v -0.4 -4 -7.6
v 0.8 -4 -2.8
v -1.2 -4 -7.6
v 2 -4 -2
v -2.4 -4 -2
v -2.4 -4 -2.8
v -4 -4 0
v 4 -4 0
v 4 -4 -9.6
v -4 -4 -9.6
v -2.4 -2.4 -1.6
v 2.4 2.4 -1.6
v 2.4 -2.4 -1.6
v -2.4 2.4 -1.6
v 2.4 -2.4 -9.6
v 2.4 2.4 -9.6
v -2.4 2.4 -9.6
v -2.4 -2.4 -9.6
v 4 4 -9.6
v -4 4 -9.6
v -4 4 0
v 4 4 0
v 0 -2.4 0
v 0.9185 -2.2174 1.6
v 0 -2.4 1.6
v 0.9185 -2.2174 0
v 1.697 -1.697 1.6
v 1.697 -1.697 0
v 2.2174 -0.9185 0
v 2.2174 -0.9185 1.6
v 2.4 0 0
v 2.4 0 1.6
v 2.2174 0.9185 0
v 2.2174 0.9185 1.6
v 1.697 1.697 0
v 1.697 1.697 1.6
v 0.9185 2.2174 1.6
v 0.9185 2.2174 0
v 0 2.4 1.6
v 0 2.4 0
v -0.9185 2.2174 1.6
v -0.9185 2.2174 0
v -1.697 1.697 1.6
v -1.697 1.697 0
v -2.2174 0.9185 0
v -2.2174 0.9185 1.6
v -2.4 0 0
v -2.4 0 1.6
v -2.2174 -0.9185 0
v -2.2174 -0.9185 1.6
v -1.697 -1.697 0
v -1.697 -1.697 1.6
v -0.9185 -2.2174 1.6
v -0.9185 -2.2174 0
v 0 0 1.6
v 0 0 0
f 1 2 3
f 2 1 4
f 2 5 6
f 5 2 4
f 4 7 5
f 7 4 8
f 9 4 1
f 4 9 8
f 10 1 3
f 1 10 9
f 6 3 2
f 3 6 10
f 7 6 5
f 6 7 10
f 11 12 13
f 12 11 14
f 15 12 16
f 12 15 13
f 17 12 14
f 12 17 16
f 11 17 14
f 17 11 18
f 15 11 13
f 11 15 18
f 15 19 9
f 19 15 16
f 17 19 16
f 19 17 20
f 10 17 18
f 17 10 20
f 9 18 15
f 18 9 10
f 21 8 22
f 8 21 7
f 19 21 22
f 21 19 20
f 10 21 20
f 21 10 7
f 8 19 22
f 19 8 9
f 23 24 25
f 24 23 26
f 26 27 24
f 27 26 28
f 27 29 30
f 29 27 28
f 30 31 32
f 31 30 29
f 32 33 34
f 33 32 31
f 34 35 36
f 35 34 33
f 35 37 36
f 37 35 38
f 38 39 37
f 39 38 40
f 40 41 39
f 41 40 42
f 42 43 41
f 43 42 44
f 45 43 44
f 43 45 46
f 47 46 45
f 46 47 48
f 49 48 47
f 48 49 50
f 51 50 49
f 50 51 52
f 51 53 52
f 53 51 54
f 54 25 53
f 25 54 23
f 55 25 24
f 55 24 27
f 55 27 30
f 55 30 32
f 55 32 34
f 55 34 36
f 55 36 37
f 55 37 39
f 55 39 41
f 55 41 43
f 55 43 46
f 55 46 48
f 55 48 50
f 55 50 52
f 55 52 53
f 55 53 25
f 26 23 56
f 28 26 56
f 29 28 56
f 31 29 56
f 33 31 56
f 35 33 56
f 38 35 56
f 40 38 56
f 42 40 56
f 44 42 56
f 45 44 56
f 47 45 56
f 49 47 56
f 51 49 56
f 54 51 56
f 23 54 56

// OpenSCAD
// file: ../p/4-4edge.scad
use <../lib.scad>
function ldraw_lib__4_4edge() = [
// 0 Circle 1.0
// 0 Name: 4-4edge.dat
// 0 Author: James Jessiman
// 0 !LDRAW_ORG Primitive UPDATE 2017-01
// 0 !LICENSE Licensed under CC BY 2.0 and CC BY 4.0 : see CAreadme.txt
// 
// 0 BFC CERTIFY CCW
  [0,"BFC","CERTIFY"],
  [0,"BFC","CCW"],
// 
// 0 !HISTORY 1998-12-15 [PTadmin] Official Update 1998-10
// 0 !HISTORY 2005-12-28 [PTadmin] Official Update 2005-01
// 0 !HISTORY 2007-06-24 [PTadmin] Header formatted for Contributor Agreement
// 0 !HISTORY 2008-07-01 [PTadmin] Official Update 2008-01
// 0 !HISTORY 2017-01-15 [Steffen] BFCed
// 0 !HISTORY 2017-12-30 [PTadmin] Official Update 2017-01
// 
// 
// 2 24 1 0 0 0.9239 0 0.3827
  [2,24,1,0,0,0.9239,0,0.3827],
// 2 24 0.9239 0 0.3827 0.7071 0 0.7071
  [2,24,0.9239,0,0.3827,0.7071,0,0.7071],
// 2 24 0.7071 0 0.7071 0.3827 0 0.9239
  [2,24,0.7071,0,0.7071,0.3827,0,0.9239],
// 2 24 0.3827 0 0.9239 0 0 1
  [2,24,0.3827,0,0.9239,0,0,1],
// 2 24 0 0 1 -0.3827 0 0.9239
  [2,24,0,0,1,-0.3827,0,0.9239],
// 2 24 -0.3827 0 0.9239 -0.7071 0 0.7071
  [2,24,-0.3827,0,0.9239,-0.7071,0,0.7071],
// 2 24 -0.7071 0 0.7071 -0.9239 0 0.3827
  [2,24,-0.7071,0,0.7071,-0.9239,0,0.3827],
// 2 24 -0.9239 0 0.3827 -1 0 -0
  [2,24,-0.9239,0,0.3827,-1,0,-0],
// 2 24 -1 0 -0 -0.9239 0 -0.3827
  [2,24,-1,0,-0,-0.9239,0,-0.3827],
// 2 24 -0.9239 0 -0.3827 -0.7071 0 -0.7071
  [2,24,-0.9239,0,-0.3827,-0.7071,0,-0.7071],
// 2 24 -0.7071 0 -0.7071 -0.3827 0 -0.9239
  [2,24,-0.7071,0,-0.7071,-0.3827,0,-0.9239],
// 2 24 -0.3827 0 -0.9239 0 0 -1
  [2,24,-0.3827,0,-0.9239,0,0,-1],
// 2 24 0 0 -1 0.3827 0 -0.9239
  [2,24,0,0,-1,0.3827,0,-0.9239],
// 2 24 0.3827 0 -0.9239 0.7071 0 -0.7071
  [2,24,0.3827,0,-0.9239,0.7071,0,-0.7071],
// 2 24 0.7071 0 -0.7071 0.9239 0 -0.3827
  [2,24,0.7071,0,-0.7071,0.9239,0,-0.3827],
// 2 24 0.9239 0 -0.3827 1 0 0
  [2,24,0.9239,0,-0.3827,1,0,0],
];
module ldraw_lib__4_4edge(step=0, col=false, unit=2/5, alt=false, line=0.2, solid=!$preview)
    makepoly(ldraw_lib__4_4edge(), step=step, col=col, unit=unit, alt=alt, line=line, solid=solid);
ldraw_lib__4_4edge(line=0.2);
// file: ../p/4-4disc.scad
use <../lib.scad>
function ldraw_lib__4_4disc() = [
// 0 Disc 1.0
// 0 Name: 4-4disc.dat
// 0 Author: James Jessiman
// 0 !LDRAW_ORG Primitive UPDATE 2002-02
// 0 !LICENSE Licensed under CC BY 2.0 and CC BY 4.0 : see CAreadme.txt
// 
// 0 BFC CERTIFY CCW
  [0,"BFC","CERTIFY"],
  [0,"BFC","CCW"],
// 
// 0 !HISTORY 1998-12-15 [PTadmin] Official Update 1998-10
// 0 !HISTORY 2002-03-23 [sbliss] Added BFC statement
// 0 !HISTORY 2002-04-25 [PTadmin] Official Update 2002-02
// 0 !HISTORY 2007-06-24 [PTadmin] Header formatted for Contributor Agreement
// 0 !HISTORY 2008-07-01 [PTadmin] Official Update 2008-01
// 
// 
// 3 16 0 0 0 1 0 0 0.9239 0 0.3827
  [3,16,0,0,0,1,0,0,0.9239,0,0.3827],
// 3 16 0 0 0 0.9239 0 0.3827 0.7071 0 0.7071
  [3,16,0,0,0,0.9239,0,0.3827,0.7071,0,0.7071],
// 3 16 0 0 0 0.7071 0 0.7071 0.3827 0 0.9239
  [3,16,0,0,0,0.7071,0,0.7071,0.3827,0,0.9239],
// 3 16 0 0 0 0.3827 0 0.9239 0 0 1
  [3,16,0,0,0,0.3827,0,0.9239,0,0,1],
// 3 16 0 0 0 0 0 1 -0.3827 0 0.9239
  [3,16,0,0,0,0,0,1,-0.3827,0,0.9239],
// 3 16 0 0 0 -0.3827 0 0.9239 -0.7071 0 0.7071
  [3,16,0,0,0,-0.3827,0,0.9239,-0.7071,0,0.7071],
// 3 16 0 0 0 -0.7071 0 0.7071 -0.9239 0 0.3827
  [3,16,0,0,0,-0.7071,0,0.7071,-0.9239,0,0.3827],
// 3 16 0 0 0 -0.9239 0 0.3827 -1 0 -0
  [3,16,0,0,0,-0.9239,0,0.3827,-1,0,-0],
// 3 16 0 0 0 -1 0 -0 -0.9239 0 -0.3827
  [3,16,0,0,0,-1,0,-0,-0.9239,0,-0.3827],
// 3 16 0 0 0 -0.9239 0 -0.3827 -0.7071 0 -0.7071
  [3,16,0,0,0,-0.9239,0,-0.3827,-0.7071,0,-0.7071],
// 3 16 0 0 0 -0.7071 0 -0.7071 -0.3827 0 -0.9239
  [3,16,0,0,0,-0.7071,0,-0.7071,-0.3827,0,-0.9239],
// 3 16 0 0 0 -0.3827 0 -0.9239 0 0 -1
  [3,16,0,0,0,-0.3827,0,-0.9239,0,0,-1],
// 3 16 0 0 0 0 0 -1 0.3827 0 -0.9239
  [3,16,0,0,0,0,0,-1,0.3827,0,-0.9239],
// 3 16 0 0 0 0.3827 0 -0.9239 0.7071 0 -0.7071
  [3,16,0,0,0,0.3827,0,-0.9239,0.7071,0,-0.7071],
// 3 16 0 0 0 0.7071 0 -0.7071 0.9239 0 -0.3827
  [3,16,0,0,0,0.7071,0,-0.7071,0.9239,0,-0.3827],
// 3 16 0 0 0 0.9239 0 -0.3827 1 0 0
  [3,16,0,0,0,0.9239,0,-0.3827,1,0,0],
// 0
];
module ldraw_lib__4_4disc(step=0, col=false, unit=2/5, alt=false, line=0.2, solid=!$preview)
    makepoly(ldraw_lib__4_4disc(), step=step, col=col, unit=unit, alt=alt, line=line, solid=solid);
ldraw_lib__4_4disc(line=0.2);
// file: ../p/4-4cyli.scad
use <../lib.scad>
$fa=1; $fs=0.2;
function ldraw_lib__4_4cyli(realsolid=false) = [
// 0 Cylinder 1.0
// 0 Name: 4-4cyli.dat
// 0 Author: James Jessiman
// 0 !LDRAW_ORG Primitive UPDATE 2005-01
// 0 !LICENSE Licensed under CC BY 2.0 and CC BY 4.0 : see CAreadme.txt
// 
// 0 BFC CERTIFY CCW
  [0,"BFC","CERTIFY"],
  [0,"BFC","CCW"],
// 
// 0 !HISTORY 1998-12-15 [PTadmin] Official Update 1998-10
// 0 !HISTORY 2002-03-23 [sbliss] Added BFC statement; merged headers from files in distributions LDraw 0.27 and Complete.
// 0 !HISTORY 2002-04-25 [PTadmin] Official Update 2002-02
// 0 !HISTORY 2004-12-14 [guyvivan] BFC CCW
// 0 !HISTORY 2005-12-28 [PTadmin] Official Update 2005-01
// 0 !HISTORY 2007-06-24 [PTadmin] Header formatted for Contributor Agreement
// 0 !HISTORY 2008-07-01 [PTadmin] Official Update 2008-01
// 
// 
// 4 16 1 1 0 0.9239 1 0.3827 0.9239 0 0.3827 1 0 0
  [4,16,1,1,0,0.9239,1,0.3827,0.9239,0,0.3827,1,0,0],
// 5 24 1 0 0 1 1 0 0.9239 0 0.3827 0.9239 0 -0.3827
  [5,24,1,0,0,1,1,0,0.9239,0,0.3827,0.9239,0,-0.3827],
// 4 16 0.9239 1 0.3827 0.7071 1 0.7071 0.7071 0 0.7071 0.9239 0 0.3827
  [4,16,0.9239,1,0.3827,0.7071,1,0.7071,0.7071,0,0.7071,0.9239,0,0.3827],
// 5 24 0.9239 0 0.3827 0.9239 1 0.3827 0.7071 0 0.7071 1 0 0
  [5,24,0.9239,0,0.3827,0.9239,1,0.3827,0.7071,0,0.7071,1,0,0],
// 4 16 0.7071 1 0.7071 0.3827 1 0.9239 0.3827 0 0.9239 0.7071 0 0.7071
  [4,16,0.7071,1,0.7071,0.3827,1,0.9239,0.3827,0,0.9239,0.7071,0,0.7071],
// 5 24 0.7071 0 0.7071 0.7071 1 0.7071 0.3827 0 0.9239 0.9239 0 0.3827
  [5,24,0.7071,0,0.7071,0.7071,1,0.7071,0.3827,0,0.9239,0.9239,0,0.3827],
// 4 16 0.3827 1 0.9239 0 1 1 0 0 1 0.3827 0 0.9239
  [4,16,0.3827,1,0.9239,0,1,1,0,0,1,0.3827,0,0.9239],
// 5 24 0.3827 0 0.9239 0.3827 1 0.9239 0 0 1 0.7071 0 0.7071
  [5,24,0.3827,0,0.9239,0.3827,1,0.9239,0,0,1,0.7071,0,0.7071],
// 4 16 0 1 1 -0.3827 1 0.9239 -0.3827 0 0.9239 0 0 1
  [4,16,0,1,1,-0.3827,1,0.9239,-0.3827,0,0.9239,0,0,1],
// 5 24 0 0 1 0 1 1 -0.3827 0 0.9239 0.3827 0 0.9239
  [5,24,0,0,1,0,1,1,-0.3827,0,0.9239,0.3827,0,0.9239],
// 4 16 -0.3827 1 0.9239 -0.7071 1 0.7071 -0.7071 0 0.7071 -0.3827 0 0.9239
  [4,16,-0.3827,1,0.9239,-0.7071,1,0.7071,-0.7071,0,0.7071,-0.3827,0,0.9239],
// 5 24 -0.3827 0 0.9239 -0.3827 1 0.9239 -0.7071 0 0.7071 0 0 1
  [5,24,-0.3827,0,0.9239,-0.3827,1,0.9239,-0.7071,0,0.7071,0,0,1],
// 4 16 -0.7071 1 0.7071 -0.9239 1 0.3827 -0.9239 0 0.3827 -0.7071 0 0.7071
  [4,16,-0.7071,1,0.7071,-0.9239,1,0.3827,-0.9239,0,0.3827,-0.7071,0,0.7071],
// 5 24 -0.7071 0 0.7071 -0.7071 1 0.7071 -0.9239 0 0.3827 -0.3827 0 0.9239
  [5,24,-0.7071,0,0.7071,-0.7071,1,0.7071,-0.9239,0,0.3827,-0.3827,0,0.9239],
// 4 16 -0.9239 1 0.3827 -1 1 0 -1 0 0 -0.9239 0 0.3827
  [4,16,-0.9239,1,0.3827,-1,1,0,-1,0,0,-0.9239,0,0.3827],
// 5 24 -0.9239 0 0.3827 -0.9239 1 0.3827 -1 0 0 -0.7071 0 0.7071
  [5,24,-0.9239,0,0.3827,-0.9239,1,0.3827,-1,0,0,-0.7071,0,0.7071],
// 4 16 -1 1 0 -0.9239 1 -0.3827 -0.9239 0 -0.3827 -1 0 0
  [4,16,-1,1,0,-0.9239,1,-0.3827,-0.9239,0,-0.3827,-1,0,0],
// 5 24 -1 0 0 -1 1 0 -0.9239 0 -0.3827 -0.9239 0 0.3827
  [5,24,-1,0,0,-1,1,0,-0.9239,0,-0.3827,-0.9239,0,0.3827],
// 4 16 -0.9239 1 -0.3827 -0.7071 1 -0.7071 -0.7071 0 -0.7071 -0.9239 0 -0.3827
  [4,16,-0.9239,1,-0.3827,-0.7071,1,-0.7071,-0.7071,0,-0.7071,-0.9239,0,-0.3827],
// 5 24 -0.9239 0 -0.3827 -0.9239 1 -0.3827 -0.7071 0 -0.7071 -1 0 0
  [5,24,-0.9239,0,-0.3827,-0.9239,1,-0.3827,-0.7071,0,-0.7071,-1,0,0],
// 4 16 -0.7071 1 -0.7071 -0.3827 1 -0.9239 -0.3827 0 -0.9239 -0.7071 0 -0.7071
  [4,16,-0.7071,1,-0.7071,-0.3827,1,-0.9239,-0.3827,0,-0.9239,-0.7071,0,-0.7071],
// 5 24 -0.7071 0 -0.7071 -0.7071 1 -0.7071 -0.3827 0 -0.9239 -0.9239 0 -0.3827
  [5,24,-0.7071,0,-0.7071,-0.7071,1,-0.7071,-0.3827,0,-0.9239,-0.9239,0,-0.3827],
// 4 16 -0.3827 1 -0.9239 0 1 -1 0 0 -1 -0.3827 0 -0.9239
  [4,16,-0.3827,1,-0.9239,0,1,-1,0,0,-1,-0.3827,0,-0.9239],
// 5 24 -0.3827 0 -0.9239 -0.3827 1 -0.9239 0 0 -1 -0.7071 0 -0.7071
  [5,24,-0.3827,0,-0.9239,-0.3827,1,-0.9239,0,0,-1,-0.7071,0,-0.7071],
// 4 16 0 1 -1 0.3827 1 -0.9239 0.3827 0 -0.9239 0 0 -1
  [4,16,0,1,-1,0.3827,1,-0.9239,0.3827,0,-0.9239,0,0,-1],
// 5 24 0 0 -1 0 1 -1 0.3827 0 -0.9239 -0.3827 0 -0.9239
  [5,24,0,0,-1,0,1,-1,0.3827,0,-0.9239,-0.3827,0,-0.9239],
// 4 16 0.3827 1 -0.9239 0.7071 1 -0.7071 0.7071 0 -0.7071 0.3827 0 -0.9239
  [4,16,0.3827,1,-0.9239,0.7071,1,-0.7071,0.7071,0,-0.7071,0.3827,0,-0.9239],
// 5 24 0.3827 0 -0.9239 0.3827 1 -0.9239 0.7071 0 -0.7071 0 0 -1
  [5,24,0.3827,0,-0.9239,0.3827,1,-0.9239,0.7071,0,-0.7071,0,0,-1],
// 4 16 0.7071 1 -0.7071 0.9239 1 -0.3827 0.9239 0 -0.3827 0.7071 0 -0.7071
  [4,16,0.7071,1,-0.7071,0.9239,1,-0.3827,0.9239,0,-0.3827,0.7071,0,-0.7071],
// 5 24 0.7071 0 -0.7071 0.7071 1 -0.7071 0.9239 0 -0.3827 0.3827 0 -0.9239
  [5,24,0.7071,0,-0.7071,0.7071,1,-0.7071,0.9239,0,-0.3827,0.3827,0,-0.9239],
// 4 16 0.9239 1 -0.3827 1 1 0 1 0 0 0.9239 0 -0.3827
  [4,16,0.9239,1,-0.3827,1,1,0,1,0,0,0.9239,0,-0.3827],
// 5 24 0.9239 0 -0.3827 0.9239 1 -0.3827 1 0 0 0.7071 0 -0.7071
  [5,24,0.9239,0,-0.3827,0.9239,1,-0.3827,1,0,0,0.7071,0,-0.7071],
// 0
];
module ldraw_lib__4_4cyli(step=0, col=false, unit=2/5, alt=false, line=0.2, solid=!$preview)
    makepoly(ldraw_lib__4_4cyli(solid), step=step, col=col, unit=unit, alt=alt, line=line, solid=solid);
ldraw_lib__4_4cyli(line=0.2);
// file: ../p/stud.scad
use <../lib.scad>
use <4-4cyli.scad>
use <4-4disc.scad>
use <4-4edge.scad>
function ldraw_lib__stud() = [
// 0 Stud
// 0 Name: stud.dat
// 0 Author: James Jessiman
// 0 !LDRAW_ORG Primitive UPDATE 2012-01
// 0 !LICENSE Licensed under CC BY 4.0 : see CAreadme.txt
// 
// 0 BFC CERTIFY CCW
  [0,"BFC","CERTIFY"],
  [0,"BFC","CCW"],
// 
// 0 !HISTORY 2002-04-04 [sbliss] Modified for BFC compliance
// 0 !HISTORY 2002-04-25 [PTadmin] Official Update 2002-02
// 0 !HISTORY 2007-06-24 [PTadmin] Header formatted for Contributor Agreement
// 0 !HISTORY 2008-07-01 [PTadmin] Official Update 2008-01
// 0 !HISTORY 2012-02-16 [Philo] Changed to CCW
// 0 !HISTORY 2012-03-30 [PTadmin] Official Update 2012-01
// 
// 
// 1 16 0 0 0 6 0 0 0 1 0 0 0 6 4-4edge.dat
  [1,16,0,0,0,6,0,0,0,1,0,0,0,6, ldraw_lib__4_4edge()],
// 1 16 0 -4 0 6 0 0 0 1 0 0 0 6 4-4edge.dat
  [1,16,0,-4,0,6,0,0,0,1,0,0,0,6, ldraw_lib__4_4edge()],
// 1 16 0 0 0 6 0 0 0 -4 0 0 0 6 4-4cyli.dat
  [1,16,0,0,0,6,0,0,0,-4,0,0,0,6, ldraw_lib__4_4cyli()],
// 1 16 0 -4 0 6 0 0 0 1 0 0 0 6 4-4disc.dat
  [1,16,0,-4,0,6,0,0,0,1,0,0,0,6, ldraw_lib__4_4disc()],
  [-1,16,0,0,0,6,0,0,0,-1,0,0,0,6, ldraw_lib__4_4disc()],
];
module ldraw_lib__stud(step=0, col=false, unit=2/5, alt=false, line=0.2, solid=!$preview)
    makepoly(ldraw_lib__stud(), step=step, col=col, unit=unit, alt=alt, line=line, solid=solid);
ldraw_lib__stud(line=0.2);
// file: ../p/box5.scad
use <../lib.scad>
function ldraw_lib__box5() = [
// 0 Box with 5 Faces and All Edges
// 0 Name: box5.dat
// 0 Author: James Jessiman
// 0 !LDRAW_ORG Primitive UPDATE 2012-01
// 0 !LICENSE Licensed under CC BY 2.0 and CC BY 4.0 : see CAreadme.txt
// 
// 0 BFC CERTIFY CCW
  [0,"BFC","CERTIFY"],
  [0,"BFC","CCW"],
// 
// 0 !HISTORY 2002-04-03 [sbliss] Modified for BFC compliance
// 0 !HISTORY 2002-04-25 [PTadmin] Official Update 2002-02
// 0 !HISTORY 2007-06-24 [PTadmin] Header formatted for Contributor Agreement
// 0 !HISTORY 2008-07-01 [PTadmin] Official Update 2008-01
// 0 !HISTORY 2012-02-16 [Philo] Changed to CCW
// 0 !HISTORY 2012-03-30 [PTadmin] Official Update 2012-01
// 
// 
// 2 24 1 1 1 -1 1 1
  [2,24,1,1,1,-1,1,1],
// 2 24 -1 1 1 -1 1 -1
  [2,24,-1,1,1,-1,1,-1],
// 2 24 -1 1 -1 1 1 -1
  [2,24,-1,1,-1,1,1,-1],
// 2 24 1 1 -1 1 1 1
  [2,24,1,1,-1,1,1,1],
// 2 24 1 0 1 -1 0 1
  [2,24,1,0,1,-1,0,1],
// 2 24 -1 0 1 -1 0 -1
  [2,24,-1,0,1,-1,0,-1],
// 2 24 -1 0 -1 1 0 -1
  [2,24,-1,0,-1,1,0,-1],
// 2 24 1 0 -1 1 0 1
  [2,24,1,0,-1,1,0,1],
// 2 24 1 0 1 1 1 1
  [2,24,1,0,1,1,1,1],
// 2 24 -1 0 1 -1 1 1
  [2,24,-1,0,1,-1,1,1],
// 2 24 1 0 -1 1 1 -1
  [2,24,1,0,-1,1,1,-1],
// 2 24 -1 0 -1 -1 1 -1
  [2,24,-1,0,-1,-1,1,-1],
// 4 16 -1 1 1 1 1 1 1 1 -1 -1 1 -1
  [4,16,-1,1,1,1,1,1,1,1,-1,-1,1,-1],
// 4 16 -1 1 1 -1 0 1 1 0 1 1 1 1
  [4,16,-1,1,1,-1,0,1,1,0,1,1,1,1],
// 4 16 -1 1 -1 -1 0 -1 -1 0 1 -1 1 1
  [4,16,-1,1,-1,-1,0,-1,-1,0,1,-1,1,1],
// 4 16 1 1 -1 1 0 -1 -1 0 -1 -1 1 -1
  [4,16,1,1,-1,1,0,-1,-1,0,-1,-1,1,-1],
// 4 16 1 1 1 1 0 1 1 0 -1 1 1 -1
  [4,16,1,1,1,1,0,1,1,0,-1,1,1,-1],
];
makepoly(ldraw_lib__box5(), line=0.2);
// file: ../p/box4t.scad
use <../lib.scad>
function ldraw_lib__box4t() = [
// 0 Box with 4 Adjacent Faces and All Edges
// 0 Name: box4t.dat
// 0 Author: Tore Eriksson [Tore_Eriksson]
// 0 !LDRAW_ORG Primitive UPDATE 2003-02
// 0 !LICENSE Licensed under CC BY 2.0 and CC BY 4.0 : see CAreadme.txt
// 
// 0 BFC CERTIFY CCW
  [0,"BFC","CERTIFY"],
  [0,"BFC","CCW"],
// 
// 0 !HISTORY 1997-09-29 [PTadmin] Official Update 1997-15
// 0 !HISTORY 2002-08-31 [izanette] Modified with WINDZ for BFC compliance
// 0 !HISTORY 2003-08-01 [PTadmin] Official Update 2003-02
// 0 !HISTORY 2007-06-24 [PTadmin] Header formatted for Contributor Agreement
// 0 !HISTORY 2008-07-01 [PTadmin] Official Update 2008-01
// 
// 
// 2 24 1 1 1 -1 1 1
  [2,24,1,1,1,-1,1,1],
// 2 24 -1 1 1 -1 1 -1
  [2,24,-1,1,1,-1,1,-1],
// 2 24 -1 1 -1 1 1 -1
  [2,24,-1,1,-1,1,1,-1],
// 2 24 1 1 -1 1 1 1
  [2,24,1,1,-1,1,1,1],
// 2 24 1 0 1 -1 0 1
  [2,24,1,0,1,-1,0,1],
// 2 24 -1 0 1 -1 0 -1
  [2,24,-1,0,1,-1,0,-1],
// 2 24 -1 0 -1 1 0 -1
  [2,24,-1,0,-1,1,0,-1],
// 2 24 1 0 -1 1 0 1
  [2,24,1,0,-1,1,0,1],
// 2 24 1 0 1 1 1 1
  [2,24,1,0,1,1,1,1],
// 2 24 -1 0 1 -1 1 1
  [2,24,-1,0,1,-1,1,1],
// 2 24 1 0 -1 1 1 -1
  [2,24,1,0,-1,1,1,-1],
// 2 24 -1 0 -1 -1 1 -1
  [2,24,-1,0,-1,-1,1,-1],
// 4 16 1 1 1 1 1 -1 -1 1 -1 -1 1 1
  [4,16,1,1,1,1,1,-1,-1,1,-1,-1,1,1],
// 4 16 1 1 1 -1 1 1 -1 0 1 1 0 1
  [4,16,1,1,1,-1,1,1,-1,0,1,1,0,1],
// 4 16 -1 1 1 -1 1 -1 -1 0 -1 -1 0 1
  [4,16,-1,1,1,-1,1,-1,-1,0,-1,-1,0,1],
// 0 4 16 -1 1 -1 -1 0 -1 1 0 -1 1 1 -1
// 4 16 1 1 -1 1 1 1 1 0 1 1 0 -1
  [4,16,1,1,-1,1,1,1,1,0,1,1,0,-1],
// 0
];
makepoly(ldraw_lib__box4t(), line=0.2);
// file: s/3005s01.scad
use <../../lib.scad>
use <../../p/box4t.scad>
use <../../p/box5.scad>
use <../../p/stud.scad>
function ldraw_lib__s__3005s01() = [
// 0 ~Brick  1 x  1 without Front Face
// 0 Name: s\3005s01.dat
// 0 Author: John Riley [jriley]
// 0 !LDRAW_ORG Subpart UPDATE 2004-01
// 0 !LICENSE Licensed under CC BY 2.0 and CC BY 4.0 : see CAreadme.txt
// 
// 0 BFC CERTIFY CCW
  [0,"BFC","CERTIFY"],
  [0,"BFC","CCW"],
// 
// 0 !HISTORY 2003-09-07 [jriley] BFCed & Subfiled
// 0 !HISTORY 2004-03-02 [PTadmin] Official Update 2004-01
// 0 !HISTORY 2007-08-29 [PTadmin] Header formatted for Contributor Agreement
// 0 !HISTORY 2008-07-01 [PTadmin] Official Update 2008-01
// 
// 
// 0 BFC INVERTNEXT
  [0,"BFC","INVERTNEXT"],
// 1 16 0 24 0 0 0 6 0 -20 0 -6 0 0 box5.dat
  [1,16,0,24,0,0,0,6,0,-20,0,-6,0,0, ldraw_lib__box5()],
// 4 16 10 24 -10 6 24 -6 6 24 6 10 24 10
  [4,16,10,24,-10,6,24,-6,6,24,6,10,24,10],
// 4 16 10 24 10 6 24 6 -6 24 6 -10 24 10
  [4,16,10,24,10,6,24,6,-6,24,6,-10,24,10],
// 4 16 -10 24 10 -6 24 6 -6 24 -6 -10 24 -10
  [4,16,-10,24,10,-6,24,6,-6,24,-6,-10,24,-10],
// 4 16 -10 24 -10 -6 24 -6 6 24 -6 10 24 -10
  [4,16,-10,24,-10,-6,24,-6,6,24,-6,10,24,-10],
// 1 16 0 24 0 10 0 0 0 -24 0 0 0 10 box4t.dat
  [1,16,0,24,0,10,0,0,0,-24,0,0,0,10, ldraw_lib__box4t()],
// 1 16 0 0 0 0 0 1 0 1 0 -1 0 0 stud.dat
  [1,16,0,0,0,0,0,1,0,1,0,-1,0,0, ldraw_lib__stud()],
// 0
];
module ldraw_lib__s__3005s01(step=0, col=false, unit=2/5, alt=false, line=0.2, solid=!$preview)
    makepoly(ldraw_lib__s__3005s01(), step=step, col=col, unit=unit, alt=alt, line=line, solid=solid);
ldraw_lib__s__3005s01(line=0.2);
// main file
use <../lib.scad>
use <s/3005s01.scad>
function ldraw_lib__3005pt7() = [
// 0 Brick  1 x  1 with Blue "7" Pattern
// 0 Name: 3005pt7.dat
// 0 Author: Tore Eriksson [Tore_Eriksson]
// 0 !LDRAW_ORG Part UPDATE 2014-02
// 0 !LICENSE Licensed under CC BY 4.0 : see CAreadme.txt
// 
// 0 BFC CERTIFY CCW
  [0,"BFC","CERTIFY"],
  [0,"BFC","CCW"],
// 
// 0 !KEYWORDS Rebrickable 3005pr9977, Set 237
// 
// 0 !HISTORY 2003-12-09 [Steffen] made use of existing subfile
// 0 !HISTORY 2004-04-22 [PTadmin] Official Update 2004-02
// 0 !HISTORY 2007-05-11 [PTadmin] Header formatted for Contributor Agreement
// 0 !HISTORY 2008-07-01 [PTadmin] Official Update 2008-01
// 0 !HISTORY 2014-12-18 [Holly-Wood] BFCed
// 0 !HISTORY 2014-12-23 [PTadmin] Official Update 2014-02
// 
// 
// 0 // Pattern
// 
// 4 1 -1 19 -10 5 5 -10 2 7 -10 -3 19 -10
  [4,1,-1,19,-10,5,5,-10,2,7,-10,-3,19,-10],
// 4 1 -6 7 -10 2 7 -10 5 5 -10 -6 5 -10
  [4,1,-6,7,-10,2,7,-10,5,5,-10,-6,5,-10],
// 4 16 -6 5 -10 5 5 -10 10 0 -10 -10 0 -10
  [4,16,-6,5,-10,5,5,-10,10,0,-10,-10,0,-10],
// 4 16 10 0 -10 5 5 -10 -1 19 -10 10 24 -10
  [4,16,10,0,-10,5,5,-10,-1,19,-10,10,24,-10],
// 4 16 10 24 -10 -1 19 -10 -3 19 -10 -10 24 -10
  [4,16,10,24,-10,-1,19,-10,-3,19,-10,-10,24,-10],
// 4 16 -10 24 -10 -3 19 -10 2 7 -10 -6 7 -10
  [4,16,-10,24,-10,-3,19,-10,2,7,-10,-6,7,-10],
// 4 16 -10 24 -10 -6 7 -10 -6 5 -10 -10 0 -10
  [4,16,-10,24,-10,-6,7,-10,-6,5,-10,-10,0,-10],
// 
// 0 // Subfile
// 1 16 0 0 0 1 0 0 0 1 0 0 0 1 s\3005s01.dat
  [1,16,0,0,0,1,0,0,0,1,0,0,0,1, ldraw_lib__s__3005s01()],
];
module ldraw_lib__3005pt7(step=0, col=false, unit=2/5, alt=false, line=0.2, solid=!$preview)
    makepoly(ldraw_lib__3005pt7(), step=step, col=col, unit=unit, alt=alt, line=line, solid=solid);
ldraw_lib__3005pt7(line=0.2);
